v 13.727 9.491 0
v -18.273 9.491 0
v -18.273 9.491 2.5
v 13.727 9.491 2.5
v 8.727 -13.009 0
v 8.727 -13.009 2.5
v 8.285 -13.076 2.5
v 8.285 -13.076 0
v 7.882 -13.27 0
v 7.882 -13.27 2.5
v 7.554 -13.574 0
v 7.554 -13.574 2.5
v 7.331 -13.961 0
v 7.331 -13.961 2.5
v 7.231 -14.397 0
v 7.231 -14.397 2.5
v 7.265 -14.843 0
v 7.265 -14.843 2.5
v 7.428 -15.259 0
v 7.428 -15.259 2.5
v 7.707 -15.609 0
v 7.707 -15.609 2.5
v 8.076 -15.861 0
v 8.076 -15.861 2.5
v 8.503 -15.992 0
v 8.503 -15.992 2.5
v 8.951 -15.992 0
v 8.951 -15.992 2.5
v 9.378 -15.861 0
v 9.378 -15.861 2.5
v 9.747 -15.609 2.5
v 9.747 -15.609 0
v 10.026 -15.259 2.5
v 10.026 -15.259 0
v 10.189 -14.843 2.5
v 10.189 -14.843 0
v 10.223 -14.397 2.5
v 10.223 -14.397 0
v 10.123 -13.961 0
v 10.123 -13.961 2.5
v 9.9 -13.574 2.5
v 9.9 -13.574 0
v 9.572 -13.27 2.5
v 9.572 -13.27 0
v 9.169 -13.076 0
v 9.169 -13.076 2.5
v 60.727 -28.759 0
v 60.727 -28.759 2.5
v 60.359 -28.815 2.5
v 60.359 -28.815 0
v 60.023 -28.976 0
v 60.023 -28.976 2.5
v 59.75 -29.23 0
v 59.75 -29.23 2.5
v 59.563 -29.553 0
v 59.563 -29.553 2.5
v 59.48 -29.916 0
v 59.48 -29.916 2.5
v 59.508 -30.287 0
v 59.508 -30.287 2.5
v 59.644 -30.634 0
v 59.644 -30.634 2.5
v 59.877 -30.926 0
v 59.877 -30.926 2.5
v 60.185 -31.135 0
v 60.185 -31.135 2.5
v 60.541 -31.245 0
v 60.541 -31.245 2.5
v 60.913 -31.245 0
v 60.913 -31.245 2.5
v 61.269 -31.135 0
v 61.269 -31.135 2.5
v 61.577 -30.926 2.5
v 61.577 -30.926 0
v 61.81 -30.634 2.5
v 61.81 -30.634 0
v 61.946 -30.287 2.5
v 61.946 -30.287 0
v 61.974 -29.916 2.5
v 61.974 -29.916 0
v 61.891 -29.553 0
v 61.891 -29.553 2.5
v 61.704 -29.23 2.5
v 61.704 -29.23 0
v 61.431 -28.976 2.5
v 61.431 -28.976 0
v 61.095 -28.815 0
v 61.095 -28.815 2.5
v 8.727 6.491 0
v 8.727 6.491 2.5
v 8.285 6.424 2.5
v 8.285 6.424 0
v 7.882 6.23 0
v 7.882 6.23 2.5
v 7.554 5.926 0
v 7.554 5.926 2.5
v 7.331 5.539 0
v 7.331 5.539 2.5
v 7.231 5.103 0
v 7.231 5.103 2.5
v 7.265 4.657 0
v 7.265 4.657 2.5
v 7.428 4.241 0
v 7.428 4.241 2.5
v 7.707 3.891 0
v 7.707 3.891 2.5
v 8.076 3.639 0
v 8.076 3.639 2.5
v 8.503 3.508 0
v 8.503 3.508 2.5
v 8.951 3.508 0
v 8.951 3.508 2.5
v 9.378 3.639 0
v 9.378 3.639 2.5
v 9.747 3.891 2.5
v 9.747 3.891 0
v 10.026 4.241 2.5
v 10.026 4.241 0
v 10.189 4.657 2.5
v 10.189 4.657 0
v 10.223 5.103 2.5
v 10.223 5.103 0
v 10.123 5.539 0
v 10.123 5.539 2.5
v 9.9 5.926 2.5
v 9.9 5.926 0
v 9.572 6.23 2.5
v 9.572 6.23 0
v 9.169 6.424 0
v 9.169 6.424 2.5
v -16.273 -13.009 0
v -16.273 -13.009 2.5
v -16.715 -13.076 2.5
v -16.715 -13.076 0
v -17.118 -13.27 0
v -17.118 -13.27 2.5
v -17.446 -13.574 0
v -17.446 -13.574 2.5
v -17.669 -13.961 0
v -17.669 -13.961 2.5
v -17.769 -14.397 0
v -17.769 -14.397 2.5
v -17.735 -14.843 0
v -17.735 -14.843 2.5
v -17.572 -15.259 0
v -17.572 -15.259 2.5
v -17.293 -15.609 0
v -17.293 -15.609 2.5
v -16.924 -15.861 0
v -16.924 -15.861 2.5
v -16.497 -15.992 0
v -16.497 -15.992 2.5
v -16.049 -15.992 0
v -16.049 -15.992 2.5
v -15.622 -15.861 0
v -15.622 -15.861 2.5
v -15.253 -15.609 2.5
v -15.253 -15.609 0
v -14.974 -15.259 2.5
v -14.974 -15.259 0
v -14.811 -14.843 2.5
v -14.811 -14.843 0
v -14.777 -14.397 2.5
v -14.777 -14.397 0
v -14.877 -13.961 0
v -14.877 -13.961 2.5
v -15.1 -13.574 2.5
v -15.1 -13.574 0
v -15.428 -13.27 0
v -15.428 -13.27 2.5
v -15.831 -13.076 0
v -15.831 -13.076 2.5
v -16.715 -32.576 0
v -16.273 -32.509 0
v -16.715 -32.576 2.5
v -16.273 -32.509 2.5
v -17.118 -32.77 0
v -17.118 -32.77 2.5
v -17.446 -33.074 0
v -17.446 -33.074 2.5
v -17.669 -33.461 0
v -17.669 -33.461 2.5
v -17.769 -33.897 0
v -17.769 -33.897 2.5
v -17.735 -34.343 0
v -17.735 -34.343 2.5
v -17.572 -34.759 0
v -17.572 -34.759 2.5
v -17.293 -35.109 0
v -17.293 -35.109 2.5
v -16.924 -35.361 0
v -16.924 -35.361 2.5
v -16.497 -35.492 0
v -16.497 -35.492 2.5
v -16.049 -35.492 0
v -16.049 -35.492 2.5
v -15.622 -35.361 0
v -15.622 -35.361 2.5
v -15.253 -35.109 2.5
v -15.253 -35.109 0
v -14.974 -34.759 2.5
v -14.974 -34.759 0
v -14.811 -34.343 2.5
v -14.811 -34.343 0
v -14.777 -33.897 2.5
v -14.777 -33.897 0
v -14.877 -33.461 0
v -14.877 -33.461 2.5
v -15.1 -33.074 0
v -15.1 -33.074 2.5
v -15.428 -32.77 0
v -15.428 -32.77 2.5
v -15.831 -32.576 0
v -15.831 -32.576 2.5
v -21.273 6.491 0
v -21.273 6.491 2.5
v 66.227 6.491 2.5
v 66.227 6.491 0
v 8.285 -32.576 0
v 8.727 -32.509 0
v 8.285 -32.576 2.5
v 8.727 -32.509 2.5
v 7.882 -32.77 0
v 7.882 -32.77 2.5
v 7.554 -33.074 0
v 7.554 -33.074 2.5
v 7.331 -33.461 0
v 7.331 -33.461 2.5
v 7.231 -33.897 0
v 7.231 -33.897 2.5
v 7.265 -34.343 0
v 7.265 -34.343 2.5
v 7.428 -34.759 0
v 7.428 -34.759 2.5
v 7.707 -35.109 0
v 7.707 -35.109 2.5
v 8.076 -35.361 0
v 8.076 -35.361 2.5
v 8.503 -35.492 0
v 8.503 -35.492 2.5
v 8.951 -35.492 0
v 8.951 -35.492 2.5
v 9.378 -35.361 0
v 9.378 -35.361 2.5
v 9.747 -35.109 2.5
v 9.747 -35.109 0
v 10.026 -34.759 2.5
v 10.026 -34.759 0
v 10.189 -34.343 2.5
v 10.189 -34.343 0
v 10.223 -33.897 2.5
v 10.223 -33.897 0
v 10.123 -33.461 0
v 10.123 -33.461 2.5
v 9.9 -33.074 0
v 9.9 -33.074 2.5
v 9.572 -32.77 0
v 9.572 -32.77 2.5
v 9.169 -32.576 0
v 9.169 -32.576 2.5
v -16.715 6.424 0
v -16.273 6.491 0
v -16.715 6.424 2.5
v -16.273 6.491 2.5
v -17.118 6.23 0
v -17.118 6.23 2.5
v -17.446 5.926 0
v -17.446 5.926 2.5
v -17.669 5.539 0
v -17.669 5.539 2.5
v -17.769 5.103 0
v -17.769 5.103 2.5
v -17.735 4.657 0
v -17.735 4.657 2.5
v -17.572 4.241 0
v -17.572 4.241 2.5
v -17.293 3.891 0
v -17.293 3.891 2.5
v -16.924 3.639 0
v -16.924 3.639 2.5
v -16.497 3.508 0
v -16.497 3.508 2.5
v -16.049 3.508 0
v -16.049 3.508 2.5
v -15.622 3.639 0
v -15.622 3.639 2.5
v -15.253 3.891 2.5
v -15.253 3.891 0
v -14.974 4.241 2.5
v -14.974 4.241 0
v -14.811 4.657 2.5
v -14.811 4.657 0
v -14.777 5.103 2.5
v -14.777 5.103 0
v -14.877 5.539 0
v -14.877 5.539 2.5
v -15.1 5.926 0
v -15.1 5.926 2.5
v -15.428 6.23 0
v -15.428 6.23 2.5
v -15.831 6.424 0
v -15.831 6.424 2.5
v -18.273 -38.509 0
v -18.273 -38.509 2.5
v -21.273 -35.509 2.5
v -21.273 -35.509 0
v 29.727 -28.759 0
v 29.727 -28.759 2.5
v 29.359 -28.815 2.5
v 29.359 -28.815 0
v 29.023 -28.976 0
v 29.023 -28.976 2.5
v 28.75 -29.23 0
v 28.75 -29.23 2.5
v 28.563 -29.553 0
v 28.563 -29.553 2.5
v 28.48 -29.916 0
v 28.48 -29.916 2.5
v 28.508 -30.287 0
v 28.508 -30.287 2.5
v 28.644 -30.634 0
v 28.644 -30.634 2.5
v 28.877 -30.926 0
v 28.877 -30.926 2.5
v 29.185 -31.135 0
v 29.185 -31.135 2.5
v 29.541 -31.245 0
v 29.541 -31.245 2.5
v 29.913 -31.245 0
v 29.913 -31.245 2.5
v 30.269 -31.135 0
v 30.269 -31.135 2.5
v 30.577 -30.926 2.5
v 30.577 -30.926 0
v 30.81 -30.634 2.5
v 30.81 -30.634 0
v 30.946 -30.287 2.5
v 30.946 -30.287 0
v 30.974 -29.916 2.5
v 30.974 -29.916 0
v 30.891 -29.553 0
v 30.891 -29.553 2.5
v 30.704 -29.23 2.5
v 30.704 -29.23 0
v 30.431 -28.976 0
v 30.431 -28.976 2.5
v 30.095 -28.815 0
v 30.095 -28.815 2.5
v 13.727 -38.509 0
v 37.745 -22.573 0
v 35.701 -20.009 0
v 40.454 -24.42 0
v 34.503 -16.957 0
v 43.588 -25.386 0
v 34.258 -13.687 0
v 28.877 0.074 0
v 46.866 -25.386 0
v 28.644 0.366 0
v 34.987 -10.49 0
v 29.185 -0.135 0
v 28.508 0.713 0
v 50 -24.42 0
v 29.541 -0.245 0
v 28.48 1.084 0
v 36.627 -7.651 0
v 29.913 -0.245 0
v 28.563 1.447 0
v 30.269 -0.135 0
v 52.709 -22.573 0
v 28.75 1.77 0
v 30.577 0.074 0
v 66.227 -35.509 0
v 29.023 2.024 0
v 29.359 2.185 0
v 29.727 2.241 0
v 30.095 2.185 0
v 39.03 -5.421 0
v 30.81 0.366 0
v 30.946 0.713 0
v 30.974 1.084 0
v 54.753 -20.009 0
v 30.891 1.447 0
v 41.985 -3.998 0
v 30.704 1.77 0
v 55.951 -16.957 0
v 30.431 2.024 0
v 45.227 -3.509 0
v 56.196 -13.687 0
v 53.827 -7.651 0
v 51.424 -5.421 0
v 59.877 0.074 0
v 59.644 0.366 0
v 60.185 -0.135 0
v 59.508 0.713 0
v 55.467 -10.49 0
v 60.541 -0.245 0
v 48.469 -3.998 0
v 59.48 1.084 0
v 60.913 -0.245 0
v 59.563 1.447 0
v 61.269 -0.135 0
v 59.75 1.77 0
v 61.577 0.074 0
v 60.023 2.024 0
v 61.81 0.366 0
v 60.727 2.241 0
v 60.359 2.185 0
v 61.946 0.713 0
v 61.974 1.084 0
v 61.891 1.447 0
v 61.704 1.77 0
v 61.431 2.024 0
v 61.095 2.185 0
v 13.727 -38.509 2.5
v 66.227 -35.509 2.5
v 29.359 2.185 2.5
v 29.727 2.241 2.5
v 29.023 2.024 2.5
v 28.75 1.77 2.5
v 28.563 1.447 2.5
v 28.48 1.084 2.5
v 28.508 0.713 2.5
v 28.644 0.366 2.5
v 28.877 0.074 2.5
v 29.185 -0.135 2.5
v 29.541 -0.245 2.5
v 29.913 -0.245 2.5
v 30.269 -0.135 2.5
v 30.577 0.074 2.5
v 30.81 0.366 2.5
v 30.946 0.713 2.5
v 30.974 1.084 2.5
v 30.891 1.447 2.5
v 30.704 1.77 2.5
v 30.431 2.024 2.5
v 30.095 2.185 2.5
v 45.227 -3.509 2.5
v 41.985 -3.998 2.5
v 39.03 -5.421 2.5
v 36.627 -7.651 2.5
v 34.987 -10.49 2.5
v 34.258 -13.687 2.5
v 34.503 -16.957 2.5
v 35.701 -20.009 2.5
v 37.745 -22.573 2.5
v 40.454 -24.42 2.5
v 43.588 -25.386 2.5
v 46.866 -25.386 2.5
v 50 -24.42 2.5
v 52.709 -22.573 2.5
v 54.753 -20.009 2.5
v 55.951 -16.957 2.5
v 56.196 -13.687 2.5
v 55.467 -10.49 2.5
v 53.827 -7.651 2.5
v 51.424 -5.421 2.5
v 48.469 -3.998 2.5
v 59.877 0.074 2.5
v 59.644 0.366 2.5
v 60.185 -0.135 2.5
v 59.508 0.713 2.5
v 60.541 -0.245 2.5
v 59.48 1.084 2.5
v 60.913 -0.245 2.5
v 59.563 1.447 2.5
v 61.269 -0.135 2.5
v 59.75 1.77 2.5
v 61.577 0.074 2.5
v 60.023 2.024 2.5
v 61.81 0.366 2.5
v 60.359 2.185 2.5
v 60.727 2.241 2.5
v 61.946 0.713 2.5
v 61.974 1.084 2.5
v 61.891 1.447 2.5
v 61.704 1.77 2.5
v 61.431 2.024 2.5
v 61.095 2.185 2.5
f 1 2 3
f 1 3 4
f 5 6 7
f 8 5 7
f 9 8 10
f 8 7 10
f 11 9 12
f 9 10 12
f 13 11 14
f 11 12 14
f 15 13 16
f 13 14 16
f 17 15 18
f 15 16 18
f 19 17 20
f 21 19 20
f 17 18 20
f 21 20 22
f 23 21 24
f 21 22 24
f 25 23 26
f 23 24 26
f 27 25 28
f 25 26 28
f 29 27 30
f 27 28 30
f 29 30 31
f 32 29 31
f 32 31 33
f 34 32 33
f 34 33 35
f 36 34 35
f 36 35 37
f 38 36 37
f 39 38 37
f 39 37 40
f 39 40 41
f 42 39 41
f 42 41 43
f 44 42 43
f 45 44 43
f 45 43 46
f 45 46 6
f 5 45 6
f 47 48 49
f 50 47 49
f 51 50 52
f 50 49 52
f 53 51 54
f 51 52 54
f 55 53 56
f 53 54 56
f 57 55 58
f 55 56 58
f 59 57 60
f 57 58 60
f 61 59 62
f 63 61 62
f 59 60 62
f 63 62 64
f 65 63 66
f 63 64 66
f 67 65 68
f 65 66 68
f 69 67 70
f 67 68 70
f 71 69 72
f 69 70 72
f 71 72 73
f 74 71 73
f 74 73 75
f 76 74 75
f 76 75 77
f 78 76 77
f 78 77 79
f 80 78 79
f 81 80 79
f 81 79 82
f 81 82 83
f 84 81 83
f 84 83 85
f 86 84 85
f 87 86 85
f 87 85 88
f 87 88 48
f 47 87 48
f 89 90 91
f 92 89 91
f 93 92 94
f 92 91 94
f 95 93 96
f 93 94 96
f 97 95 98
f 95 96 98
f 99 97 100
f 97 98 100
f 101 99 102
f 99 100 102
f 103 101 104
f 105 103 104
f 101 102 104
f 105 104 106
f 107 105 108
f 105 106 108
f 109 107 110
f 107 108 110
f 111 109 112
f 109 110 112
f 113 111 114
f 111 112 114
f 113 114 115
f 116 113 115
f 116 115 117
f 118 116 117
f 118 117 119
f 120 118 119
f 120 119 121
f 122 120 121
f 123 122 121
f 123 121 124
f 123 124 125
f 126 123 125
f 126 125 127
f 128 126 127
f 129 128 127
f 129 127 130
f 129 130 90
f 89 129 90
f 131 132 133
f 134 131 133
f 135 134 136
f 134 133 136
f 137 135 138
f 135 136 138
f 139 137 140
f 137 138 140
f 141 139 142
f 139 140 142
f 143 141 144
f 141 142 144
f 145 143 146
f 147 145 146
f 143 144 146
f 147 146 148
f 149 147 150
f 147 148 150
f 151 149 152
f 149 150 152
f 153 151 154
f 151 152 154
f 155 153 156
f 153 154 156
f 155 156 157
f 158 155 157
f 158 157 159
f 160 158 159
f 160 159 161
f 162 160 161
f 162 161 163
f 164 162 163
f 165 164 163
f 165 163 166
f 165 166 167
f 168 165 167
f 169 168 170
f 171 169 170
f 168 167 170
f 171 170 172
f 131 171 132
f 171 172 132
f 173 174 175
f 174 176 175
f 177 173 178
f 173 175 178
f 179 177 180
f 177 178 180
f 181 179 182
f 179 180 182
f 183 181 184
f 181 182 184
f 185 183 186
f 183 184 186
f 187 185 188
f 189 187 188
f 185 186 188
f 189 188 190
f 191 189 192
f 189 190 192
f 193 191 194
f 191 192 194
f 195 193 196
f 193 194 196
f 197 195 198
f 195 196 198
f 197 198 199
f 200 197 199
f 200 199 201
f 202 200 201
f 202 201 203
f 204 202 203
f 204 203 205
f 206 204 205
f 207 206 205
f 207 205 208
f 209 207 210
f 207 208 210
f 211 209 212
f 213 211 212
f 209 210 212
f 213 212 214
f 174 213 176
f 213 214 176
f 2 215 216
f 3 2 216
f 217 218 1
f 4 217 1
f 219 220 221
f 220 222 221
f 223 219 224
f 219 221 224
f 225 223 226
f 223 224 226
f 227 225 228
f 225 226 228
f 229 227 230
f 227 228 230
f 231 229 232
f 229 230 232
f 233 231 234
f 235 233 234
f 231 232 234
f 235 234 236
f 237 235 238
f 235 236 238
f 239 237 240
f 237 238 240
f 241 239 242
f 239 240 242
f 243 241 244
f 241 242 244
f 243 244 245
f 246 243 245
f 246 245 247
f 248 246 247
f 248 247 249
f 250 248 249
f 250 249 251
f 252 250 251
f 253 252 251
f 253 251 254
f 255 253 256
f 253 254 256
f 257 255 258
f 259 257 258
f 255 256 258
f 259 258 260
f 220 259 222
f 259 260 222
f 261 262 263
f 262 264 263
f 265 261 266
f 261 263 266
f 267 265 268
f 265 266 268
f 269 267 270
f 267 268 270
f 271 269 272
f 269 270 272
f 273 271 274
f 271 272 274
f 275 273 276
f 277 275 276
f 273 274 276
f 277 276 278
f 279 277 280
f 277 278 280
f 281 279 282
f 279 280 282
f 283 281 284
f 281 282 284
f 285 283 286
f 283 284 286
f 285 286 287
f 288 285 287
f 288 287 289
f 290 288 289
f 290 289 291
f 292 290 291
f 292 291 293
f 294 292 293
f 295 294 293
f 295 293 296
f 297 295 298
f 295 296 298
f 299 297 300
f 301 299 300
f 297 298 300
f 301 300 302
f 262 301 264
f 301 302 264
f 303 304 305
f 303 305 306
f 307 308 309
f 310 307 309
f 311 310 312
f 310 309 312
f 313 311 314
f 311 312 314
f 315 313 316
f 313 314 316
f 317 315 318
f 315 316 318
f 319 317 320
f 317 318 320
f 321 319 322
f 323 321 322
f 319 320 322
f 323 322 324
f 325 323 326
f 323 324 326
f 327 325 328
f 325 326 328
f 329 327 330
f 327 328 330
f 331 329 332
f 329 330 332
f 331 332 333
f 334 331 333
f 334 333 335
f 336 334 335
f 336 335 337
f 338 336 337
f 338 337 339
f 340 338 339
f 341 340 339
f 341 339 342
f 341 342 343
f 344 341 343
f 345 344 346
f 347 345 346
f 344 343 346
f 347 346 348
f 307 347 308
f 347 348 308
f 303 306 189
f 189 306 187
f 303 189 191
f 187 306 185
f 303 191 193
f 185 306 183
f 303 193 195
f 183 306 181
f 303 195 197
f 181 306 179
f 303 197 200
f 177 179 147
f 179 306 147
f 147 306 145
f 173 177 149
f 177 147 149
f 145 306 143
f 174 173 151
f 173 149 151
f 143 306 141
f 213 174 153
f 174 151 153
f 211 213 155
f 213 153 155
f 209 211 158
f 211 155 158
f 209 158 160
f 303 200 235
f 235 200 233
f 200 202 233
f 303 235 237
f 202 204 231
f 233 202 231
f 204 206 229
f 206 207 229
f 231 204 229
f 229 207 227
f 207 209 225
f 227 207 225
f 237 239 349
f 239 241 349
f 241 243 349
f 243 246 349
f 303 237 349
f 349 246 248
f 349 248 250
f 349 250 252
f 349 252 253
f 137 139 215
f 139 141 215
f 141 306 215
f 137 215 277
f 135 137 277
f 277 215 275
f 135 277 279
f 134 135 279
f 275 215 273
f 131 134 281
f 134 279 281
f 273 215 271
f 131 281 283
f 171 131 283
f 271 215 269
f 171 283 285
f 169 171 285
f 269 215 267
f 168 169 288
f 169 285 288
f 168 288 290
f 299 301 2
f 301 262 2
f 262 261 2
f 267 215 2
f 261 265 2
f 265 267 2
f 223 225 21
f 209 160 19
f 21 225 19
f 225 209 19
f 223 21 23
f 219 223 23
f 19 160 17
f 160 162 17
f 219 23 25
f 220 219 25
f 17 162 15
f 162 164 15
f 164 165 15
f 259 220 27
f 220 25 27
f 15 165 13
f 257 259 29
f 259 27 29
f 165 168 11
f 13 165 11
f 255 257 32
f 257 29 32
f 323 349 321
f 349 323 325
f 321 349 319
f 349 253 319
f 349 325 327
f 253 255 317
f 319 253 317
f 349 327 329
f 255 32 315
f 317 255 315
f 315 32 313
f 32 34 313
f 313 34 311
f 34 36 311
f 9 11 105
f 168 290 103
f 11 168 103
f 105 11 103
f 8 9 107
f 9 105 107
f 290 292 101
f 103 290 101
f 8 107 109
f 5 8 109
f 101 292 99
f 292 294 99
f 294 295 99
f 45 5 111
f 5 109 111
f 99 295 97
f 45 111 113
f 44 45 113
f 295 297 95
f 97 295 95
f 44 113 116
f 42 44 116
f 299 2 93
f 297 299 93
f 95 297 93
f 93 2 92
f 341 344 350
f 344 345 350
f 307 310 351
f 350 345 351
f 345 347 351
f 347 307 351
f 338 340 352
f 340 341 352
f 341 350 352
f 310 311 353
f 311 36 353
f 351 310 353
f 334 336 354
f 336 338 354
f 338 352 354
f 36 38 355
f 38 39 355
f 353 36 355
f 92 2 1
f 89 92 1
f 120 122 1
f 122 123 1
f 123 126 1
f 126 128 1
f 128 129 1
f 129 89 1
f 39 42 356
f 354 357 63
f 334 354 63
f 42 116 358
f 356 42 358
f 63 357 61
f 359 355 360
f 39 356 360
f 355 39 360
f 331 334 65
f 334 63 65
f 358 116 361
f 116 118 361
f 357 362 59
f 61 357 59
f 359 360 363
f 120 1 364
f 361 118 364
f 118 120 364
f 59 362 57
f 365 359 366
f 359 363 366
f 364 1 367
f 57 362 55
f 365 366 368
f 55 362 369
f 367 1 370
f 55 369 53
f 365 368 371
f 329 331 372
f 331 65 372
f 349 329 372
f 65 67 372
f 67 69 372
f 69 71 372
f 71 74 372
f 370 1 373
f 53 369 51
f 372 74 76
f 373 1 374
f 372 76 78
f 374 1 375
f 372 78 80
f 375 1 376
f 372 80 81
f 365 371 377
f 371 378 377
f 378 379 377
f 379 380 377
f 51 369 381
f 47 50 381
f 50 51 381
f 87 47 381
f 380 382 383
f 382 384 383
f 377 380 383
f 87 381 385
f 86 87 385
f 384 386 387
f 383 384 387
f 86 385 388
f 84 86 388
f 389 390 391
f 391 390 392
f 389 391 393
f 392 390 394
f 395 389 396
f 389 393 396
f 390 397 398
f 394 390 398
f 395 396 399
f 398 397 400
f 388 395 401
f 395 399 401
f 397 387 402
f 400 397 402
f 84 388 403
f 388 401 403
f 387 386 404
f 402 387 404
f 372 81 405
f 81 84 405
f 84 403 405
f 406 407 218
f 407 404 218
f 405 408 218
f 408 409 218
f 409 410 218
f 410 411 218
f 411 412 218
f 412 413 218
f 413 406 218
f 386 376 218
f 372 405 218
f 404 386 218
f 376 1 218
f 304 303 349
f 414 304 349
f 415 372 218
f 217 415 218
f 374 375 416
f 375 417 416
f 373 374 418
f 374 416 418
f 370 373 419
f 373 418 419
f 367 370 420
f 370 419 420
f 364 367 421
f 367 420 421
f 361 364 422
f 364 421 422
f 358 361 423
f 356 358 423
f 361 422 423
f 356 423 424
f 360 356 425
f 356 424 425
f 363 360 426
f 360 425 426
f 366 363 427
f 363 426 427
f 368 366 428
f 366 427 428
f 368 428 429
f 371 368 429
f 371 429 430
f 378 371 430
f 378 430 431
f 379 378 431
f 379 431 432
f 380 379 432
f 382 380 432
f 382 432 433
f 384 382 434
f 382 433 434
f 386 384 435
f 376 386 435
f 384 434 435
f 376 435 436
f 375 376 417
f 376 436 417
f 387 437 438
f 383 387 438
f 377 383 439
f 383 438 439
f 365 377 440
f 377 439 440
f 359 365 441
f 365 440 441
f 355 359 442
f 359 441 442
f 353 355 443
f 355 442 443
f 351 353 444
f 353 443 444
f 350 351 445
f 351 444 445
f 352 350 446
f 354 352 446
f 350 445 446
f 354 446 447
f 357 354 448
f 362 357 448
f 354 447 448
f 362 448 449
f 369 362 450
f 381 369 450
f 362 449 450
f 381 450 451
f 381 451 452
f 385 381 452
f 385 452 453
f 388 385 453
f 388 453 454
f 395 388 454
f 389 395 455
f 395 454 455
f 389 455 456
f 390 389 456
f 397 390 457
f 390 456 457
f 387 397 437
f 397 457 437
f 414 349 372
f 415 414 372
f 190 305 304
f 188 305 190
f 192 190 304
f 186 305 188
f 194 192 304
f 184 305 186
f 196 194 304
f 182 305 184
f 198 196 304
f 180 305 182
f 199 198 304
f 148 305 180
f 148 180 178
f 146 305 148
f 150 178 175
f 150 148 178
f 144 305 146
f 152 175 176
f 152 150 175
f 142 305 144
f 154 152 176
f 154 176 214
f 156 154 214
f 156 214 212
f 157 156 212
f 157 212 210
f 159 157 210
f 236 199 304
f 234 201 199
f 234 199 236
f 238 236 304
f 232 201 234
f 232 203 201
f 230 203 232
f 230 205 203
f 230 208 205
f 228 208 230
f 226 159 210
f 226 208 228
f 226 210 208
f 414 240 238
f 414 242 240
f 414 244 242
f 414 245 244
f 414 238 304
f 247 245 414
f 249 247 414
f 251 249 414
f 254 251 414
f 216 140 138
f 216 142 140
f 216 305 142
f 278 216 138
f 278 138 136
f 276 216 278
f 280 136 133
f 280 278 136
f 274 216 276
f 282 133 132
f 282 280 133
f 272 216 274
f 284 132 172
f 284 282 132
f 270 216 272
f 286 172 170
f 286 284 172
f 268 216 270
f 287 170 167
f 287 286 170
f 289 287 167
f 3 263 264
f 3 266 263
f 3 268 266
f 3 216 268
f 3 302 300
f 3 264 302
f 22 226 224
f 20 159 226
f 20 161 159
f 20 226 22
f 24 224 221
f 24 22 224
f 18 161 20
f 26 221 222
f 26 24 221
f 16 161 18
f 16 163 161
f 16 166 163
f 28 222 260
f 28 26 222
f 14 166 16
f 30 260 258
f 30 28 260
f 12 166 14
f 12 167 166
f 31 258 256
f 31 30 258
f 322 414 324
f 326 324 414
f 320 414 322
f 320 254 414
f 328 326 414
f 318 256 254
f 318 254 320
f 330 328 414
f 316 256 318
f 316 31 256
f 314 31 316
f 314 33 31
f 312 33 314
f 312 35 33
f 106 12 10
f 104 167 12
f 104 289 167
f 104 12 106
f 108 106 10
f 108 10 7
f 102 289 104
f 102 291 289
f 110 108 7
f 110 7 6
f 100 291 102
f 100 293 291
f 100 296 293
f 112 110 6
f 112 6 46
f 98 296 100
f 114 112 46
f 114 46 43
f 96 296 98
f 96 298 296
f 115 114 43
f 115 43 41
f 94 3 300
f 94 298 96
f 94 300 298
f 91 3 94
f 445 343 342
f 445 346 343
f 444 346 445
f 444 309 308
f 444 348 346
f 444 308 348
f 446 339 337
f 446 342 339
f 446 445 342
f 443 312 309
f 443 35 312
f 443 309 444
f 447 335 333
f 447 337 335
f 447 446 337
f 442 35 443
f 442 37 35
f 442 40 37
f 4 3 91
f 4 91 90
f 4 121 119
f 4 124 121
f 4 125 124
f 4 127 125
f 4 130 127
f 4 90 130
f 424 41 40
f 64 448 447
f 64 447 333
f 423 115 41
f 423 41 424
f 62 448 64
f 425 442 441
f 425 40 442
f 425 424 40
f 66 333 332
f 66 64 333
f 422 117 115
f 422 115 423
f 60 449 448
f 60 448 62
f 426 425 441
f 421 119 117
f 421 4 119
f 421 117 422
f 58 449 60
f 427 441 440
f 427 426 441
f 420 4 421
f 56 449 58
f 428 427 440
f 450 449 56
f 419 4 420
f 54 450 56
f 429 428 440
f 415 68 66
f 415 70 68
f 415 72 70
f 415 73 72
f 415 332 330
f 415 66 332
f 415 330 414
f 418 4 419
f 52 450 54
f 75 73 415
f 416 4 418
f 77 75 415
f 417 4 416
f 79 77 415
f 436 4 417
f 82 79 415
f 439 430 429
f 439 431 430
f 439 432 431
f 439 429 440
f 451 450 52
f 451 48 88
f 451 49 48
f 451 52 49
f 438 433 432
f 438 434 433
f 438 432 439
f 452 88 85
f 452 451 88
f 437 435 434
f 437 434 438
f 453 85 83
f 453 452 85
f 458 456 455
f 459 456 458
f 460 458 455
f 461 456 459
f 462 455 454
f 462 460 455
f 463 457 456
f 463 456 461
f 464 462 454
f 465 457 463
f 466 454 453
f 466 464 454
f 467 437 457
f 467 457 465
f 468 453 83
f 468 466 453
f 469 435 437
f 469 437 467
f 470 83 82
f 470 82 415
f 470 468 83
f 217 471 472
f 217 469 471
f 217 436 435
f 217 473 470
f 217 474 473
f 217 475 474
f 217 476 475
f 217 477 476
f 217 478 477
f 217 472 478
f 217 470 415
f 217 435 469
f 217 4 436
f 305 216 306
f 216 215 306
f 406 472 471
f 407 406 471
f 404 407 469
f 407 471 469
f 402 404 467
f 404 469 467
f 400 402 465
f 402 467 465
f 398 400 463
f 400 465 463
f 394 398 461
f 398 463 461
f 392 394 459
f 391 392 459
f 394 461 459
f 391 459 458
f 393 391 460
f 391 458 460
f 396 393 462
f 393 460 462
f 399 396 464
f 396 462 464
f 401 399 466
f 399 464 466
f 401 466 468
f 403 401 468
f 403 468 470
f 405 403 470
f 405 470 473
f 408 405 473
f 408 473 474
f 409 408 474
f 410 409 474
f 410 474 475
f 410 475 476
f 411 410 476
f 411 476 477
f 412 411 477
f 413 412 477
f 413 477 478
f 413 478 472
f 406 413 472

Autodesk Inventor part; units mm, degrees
ref_plane "YZ Plane" through (0, 0, 0) normal (1, 0, 0) x (0, 1, 0)
ref_plane "XZ Plane" through (0, 0, 0) normal (0, 1, 0) x (-1, 0, 0)
ref_plane "XY Plane" through (0, 0, 0) normal (0, 0, 1) x (1, 0, 0)
sketch "Sketch1" plane through (0, 0, 0) normal (0, 0, 1) x (1, 0, 0)
  line L0 (-21.273, 9.4908) -> (-21.273, -38.5092)
  line L1 (-21.273, -38.5092) -> (13.727, -38.5092)
  line L2 (66.227, -35.5092) -> (66.227, 6.4908)
  line L3 (-21.273, 9.4908) -> (13.727, 9.4908)
  line L4 (13.727, 9.4908) -> (13.727, 6.4908)
  line L5 (13.727, 6.4908) -> (66.227, 6.4908)
  line L6 (13.727, 6.4908) -> (13.727, -38.5092)
  line L7 (66.227, -35.5092) -> (13.727, -35.5092)
  line L8 (13.727, -38.5092) -> (66.227, -35.5092)
  line L9 (66.227, 6.4908) -> (13.727, 9.4908)
  point P0 (0, 0)
  point P1 (-16.273, 4.9908)
  point P2 (-16.273, -14.5092)
  point P3 (-16.273, -34.0092)
  point P4 (8.727, 4.9908)
  point P5 (8.727, -14.5092)
  point P6 (8.727, -34.0092)
  point P7 (29.727, 0.9908)
  point P8 (29.727, -30.0092)
  point P9 (60.727, -30.0092)
  point P10 (60.727, 0.9908)
  point P11 (45.227, -14.5092)
  dimension "d0" = 48
  dimension "d2" = 42
  dimension "d3" = 35
  dimension "d4" = 5
  dimension "d5" = 5
  dimension "d6" = 4.5
  dimension "d7" = 4.5
  dimension "d8" = 24
  dimension "d9" = 31
  dimension "d10" = 31
  dimension "d13" = 15.5
  dimension "d14" = 15.5
  dimension "d44" = 5.5
  dimension "d45" = 87.5
  dimension "d46" = 5.5
  dimension "d47" = 3
  dimension "d52" = 52.5
extrude "Extrusion1" add sketch "Sketch1" along normal blind 2.5
hole "Hole1" at (-16.273, 4.9908, 0) at (-16.273, -14.5092, 0) at (-16.273, -34.0092, 0) at (8.727, 4.9908, 0) at (8.727, -14.5092, 0) at (8.727, -34.0092, 0) direction (0, 0, 1) diameter 3 end through all
hole "Hole2" at (29.727, 0.9908, 0) at (29.727, -30.0092, 0) at (60.727, -30.0092, 0) at (60.727, 0.9908, 0) direction (0, 0, 1) diameter 2.5 end through all
hole "Hole3" at (45.227, -14.5092, 0) direction (0, 0, 1) diameter 22 end through all
chamfer "Chamfer3" distance 3 angle 45 2 edges at (-21.273, -38.5092, 1.25) (-21.273, 9.4908, 1.25)
equation "\"d47\" = -0.5 * d2 + 0.5 * d0"
properties part number "LC_ALU_3mm_X_axis_stepper_mount_plate" material "Aluminum 6061-AHC"
